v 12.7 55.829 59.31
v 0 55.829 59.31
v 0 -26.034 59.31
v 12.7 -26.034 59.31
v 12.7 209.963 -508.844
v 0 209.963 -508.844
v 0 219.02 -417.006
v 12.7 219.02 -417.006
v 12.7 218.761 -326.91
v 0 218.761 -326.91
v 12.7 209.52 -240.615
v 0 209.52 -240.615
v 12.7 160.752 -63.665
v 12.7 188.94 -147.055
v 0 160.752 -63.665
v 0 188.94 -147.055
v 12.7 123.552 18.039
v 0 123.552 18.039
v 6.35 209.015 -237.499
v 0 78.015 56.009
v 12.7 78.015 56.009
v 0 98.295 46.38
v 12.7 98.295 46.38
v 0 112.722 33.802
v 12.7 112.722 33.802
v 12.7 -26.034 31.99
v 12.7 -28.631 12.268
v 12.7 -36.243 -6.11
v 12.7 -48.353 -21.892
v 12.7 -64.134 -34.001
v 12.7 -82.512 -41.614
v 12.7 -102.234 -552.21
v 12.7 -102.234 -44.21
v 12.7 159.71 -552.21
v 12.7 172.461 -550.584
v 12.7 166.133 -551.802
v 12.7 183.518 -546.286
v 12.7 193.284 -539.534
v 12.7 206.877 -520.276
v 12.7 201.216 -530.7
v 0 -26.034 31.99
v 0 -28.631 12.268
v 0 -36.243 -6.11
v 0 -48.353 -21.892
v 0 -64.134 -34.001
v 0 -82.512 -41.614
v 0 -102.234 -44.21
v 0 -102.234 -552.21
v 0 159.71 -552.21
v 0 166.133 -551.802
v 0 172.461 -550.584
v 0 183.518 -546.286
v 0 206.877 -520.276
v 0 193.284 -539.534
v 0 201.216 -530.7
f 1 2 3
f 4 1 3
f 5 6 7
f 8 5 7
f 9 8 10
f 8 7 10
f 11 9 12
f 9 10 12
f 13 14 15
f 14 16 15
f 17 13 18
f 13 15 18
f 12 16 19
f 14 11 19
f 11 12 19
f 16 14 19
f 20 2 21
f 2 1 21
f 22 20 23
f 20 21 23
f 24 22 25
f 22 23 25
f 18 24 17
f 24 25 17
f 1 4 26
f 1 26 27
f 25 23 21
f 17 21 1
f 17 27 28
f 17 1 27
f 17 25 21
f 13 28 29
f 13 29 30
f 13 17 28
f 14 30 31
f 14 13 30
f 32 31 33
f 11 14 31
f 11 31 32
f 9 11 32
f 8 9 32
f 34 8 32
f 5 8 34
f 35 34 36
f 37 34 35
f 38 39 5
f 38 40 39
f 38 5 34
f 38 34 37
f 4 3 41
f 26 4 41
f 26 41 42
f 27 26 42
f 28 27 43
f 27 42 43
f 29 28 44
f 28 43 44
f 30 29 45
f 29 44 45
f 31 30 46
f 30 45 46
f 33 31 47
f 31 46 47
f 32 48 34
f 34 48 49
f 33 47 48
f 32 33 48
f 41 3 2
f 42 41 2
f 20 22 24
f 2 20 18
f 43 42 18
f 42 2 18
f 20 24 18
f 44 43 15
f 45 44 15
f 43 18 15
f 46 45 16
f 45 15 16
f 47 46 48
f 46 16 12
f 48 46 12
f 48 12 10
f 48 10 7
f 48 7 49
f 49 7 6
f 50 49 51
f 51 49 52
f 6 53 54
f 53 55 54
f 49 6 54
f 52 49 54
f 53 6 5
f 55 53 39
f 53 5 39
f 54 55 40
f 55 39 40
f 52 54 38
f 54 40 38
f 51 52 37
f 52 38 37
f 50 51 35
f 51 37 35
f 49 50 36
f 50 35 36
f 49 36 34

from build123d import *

# Parameters (mm, degrees)
BOSS_EXTRUDE1_DEPTH = 12.7
FILLET1_R           = 76.2
FILLET2_R           = 50.8


with BuildPart() as part:
    # Sketch1 → Boss-Extrude1 (new body)
    with BuildSketch(Plane(origin=(0, 0, 0), x_dir=(0, 0, -1), z_dir=(1, 0, 0))):
        with BuildLine():
            Line((-59.310344828, 100.965517241), (-59.310344828, -26.034482759))
            Line((-59.310344828, -26.034482759), (-31.989836752, -26.034482759))
            ThreePointArc((-31.989836752, -26.034482759), (21.891699975, -48.352946032), (44.210163248, -102.234482759))
            Line((44.210163248, -102.234482759), (552.210163248, -102.234482759))
            Line((552.210163248, -102.234482759), (552.210163248, 202.565517241))
            add(Edge.make_bspline(
                [(552.210163248, 202.565517241), (225.141214241, 265.702079645), (-59.310344828, 100.965517241)],
                knots=[0, 0, 0, 1, 1, 1], degree=2))
        make_face()
    extrude(amount=BOSS_EXTRUDE1_DEPTH)

    # Fillet1
    fillet1_edges = [part.edges().sort_by_distance(p)[0] for p in [
        (6.35, 100.965517241, 59.310344828),
    ]]
    fillet(fillet1_edges, radius=FILLET1_R)

    # Fillet2
    fillet2_edges = [part.edges().sort_by_distance(p)[0] for p in [
        (6.35, 202.565517241, -552.210163248),
    ]]
    fillet(fillet2_edges, radius=FILLET2_R)


solid = part.part
